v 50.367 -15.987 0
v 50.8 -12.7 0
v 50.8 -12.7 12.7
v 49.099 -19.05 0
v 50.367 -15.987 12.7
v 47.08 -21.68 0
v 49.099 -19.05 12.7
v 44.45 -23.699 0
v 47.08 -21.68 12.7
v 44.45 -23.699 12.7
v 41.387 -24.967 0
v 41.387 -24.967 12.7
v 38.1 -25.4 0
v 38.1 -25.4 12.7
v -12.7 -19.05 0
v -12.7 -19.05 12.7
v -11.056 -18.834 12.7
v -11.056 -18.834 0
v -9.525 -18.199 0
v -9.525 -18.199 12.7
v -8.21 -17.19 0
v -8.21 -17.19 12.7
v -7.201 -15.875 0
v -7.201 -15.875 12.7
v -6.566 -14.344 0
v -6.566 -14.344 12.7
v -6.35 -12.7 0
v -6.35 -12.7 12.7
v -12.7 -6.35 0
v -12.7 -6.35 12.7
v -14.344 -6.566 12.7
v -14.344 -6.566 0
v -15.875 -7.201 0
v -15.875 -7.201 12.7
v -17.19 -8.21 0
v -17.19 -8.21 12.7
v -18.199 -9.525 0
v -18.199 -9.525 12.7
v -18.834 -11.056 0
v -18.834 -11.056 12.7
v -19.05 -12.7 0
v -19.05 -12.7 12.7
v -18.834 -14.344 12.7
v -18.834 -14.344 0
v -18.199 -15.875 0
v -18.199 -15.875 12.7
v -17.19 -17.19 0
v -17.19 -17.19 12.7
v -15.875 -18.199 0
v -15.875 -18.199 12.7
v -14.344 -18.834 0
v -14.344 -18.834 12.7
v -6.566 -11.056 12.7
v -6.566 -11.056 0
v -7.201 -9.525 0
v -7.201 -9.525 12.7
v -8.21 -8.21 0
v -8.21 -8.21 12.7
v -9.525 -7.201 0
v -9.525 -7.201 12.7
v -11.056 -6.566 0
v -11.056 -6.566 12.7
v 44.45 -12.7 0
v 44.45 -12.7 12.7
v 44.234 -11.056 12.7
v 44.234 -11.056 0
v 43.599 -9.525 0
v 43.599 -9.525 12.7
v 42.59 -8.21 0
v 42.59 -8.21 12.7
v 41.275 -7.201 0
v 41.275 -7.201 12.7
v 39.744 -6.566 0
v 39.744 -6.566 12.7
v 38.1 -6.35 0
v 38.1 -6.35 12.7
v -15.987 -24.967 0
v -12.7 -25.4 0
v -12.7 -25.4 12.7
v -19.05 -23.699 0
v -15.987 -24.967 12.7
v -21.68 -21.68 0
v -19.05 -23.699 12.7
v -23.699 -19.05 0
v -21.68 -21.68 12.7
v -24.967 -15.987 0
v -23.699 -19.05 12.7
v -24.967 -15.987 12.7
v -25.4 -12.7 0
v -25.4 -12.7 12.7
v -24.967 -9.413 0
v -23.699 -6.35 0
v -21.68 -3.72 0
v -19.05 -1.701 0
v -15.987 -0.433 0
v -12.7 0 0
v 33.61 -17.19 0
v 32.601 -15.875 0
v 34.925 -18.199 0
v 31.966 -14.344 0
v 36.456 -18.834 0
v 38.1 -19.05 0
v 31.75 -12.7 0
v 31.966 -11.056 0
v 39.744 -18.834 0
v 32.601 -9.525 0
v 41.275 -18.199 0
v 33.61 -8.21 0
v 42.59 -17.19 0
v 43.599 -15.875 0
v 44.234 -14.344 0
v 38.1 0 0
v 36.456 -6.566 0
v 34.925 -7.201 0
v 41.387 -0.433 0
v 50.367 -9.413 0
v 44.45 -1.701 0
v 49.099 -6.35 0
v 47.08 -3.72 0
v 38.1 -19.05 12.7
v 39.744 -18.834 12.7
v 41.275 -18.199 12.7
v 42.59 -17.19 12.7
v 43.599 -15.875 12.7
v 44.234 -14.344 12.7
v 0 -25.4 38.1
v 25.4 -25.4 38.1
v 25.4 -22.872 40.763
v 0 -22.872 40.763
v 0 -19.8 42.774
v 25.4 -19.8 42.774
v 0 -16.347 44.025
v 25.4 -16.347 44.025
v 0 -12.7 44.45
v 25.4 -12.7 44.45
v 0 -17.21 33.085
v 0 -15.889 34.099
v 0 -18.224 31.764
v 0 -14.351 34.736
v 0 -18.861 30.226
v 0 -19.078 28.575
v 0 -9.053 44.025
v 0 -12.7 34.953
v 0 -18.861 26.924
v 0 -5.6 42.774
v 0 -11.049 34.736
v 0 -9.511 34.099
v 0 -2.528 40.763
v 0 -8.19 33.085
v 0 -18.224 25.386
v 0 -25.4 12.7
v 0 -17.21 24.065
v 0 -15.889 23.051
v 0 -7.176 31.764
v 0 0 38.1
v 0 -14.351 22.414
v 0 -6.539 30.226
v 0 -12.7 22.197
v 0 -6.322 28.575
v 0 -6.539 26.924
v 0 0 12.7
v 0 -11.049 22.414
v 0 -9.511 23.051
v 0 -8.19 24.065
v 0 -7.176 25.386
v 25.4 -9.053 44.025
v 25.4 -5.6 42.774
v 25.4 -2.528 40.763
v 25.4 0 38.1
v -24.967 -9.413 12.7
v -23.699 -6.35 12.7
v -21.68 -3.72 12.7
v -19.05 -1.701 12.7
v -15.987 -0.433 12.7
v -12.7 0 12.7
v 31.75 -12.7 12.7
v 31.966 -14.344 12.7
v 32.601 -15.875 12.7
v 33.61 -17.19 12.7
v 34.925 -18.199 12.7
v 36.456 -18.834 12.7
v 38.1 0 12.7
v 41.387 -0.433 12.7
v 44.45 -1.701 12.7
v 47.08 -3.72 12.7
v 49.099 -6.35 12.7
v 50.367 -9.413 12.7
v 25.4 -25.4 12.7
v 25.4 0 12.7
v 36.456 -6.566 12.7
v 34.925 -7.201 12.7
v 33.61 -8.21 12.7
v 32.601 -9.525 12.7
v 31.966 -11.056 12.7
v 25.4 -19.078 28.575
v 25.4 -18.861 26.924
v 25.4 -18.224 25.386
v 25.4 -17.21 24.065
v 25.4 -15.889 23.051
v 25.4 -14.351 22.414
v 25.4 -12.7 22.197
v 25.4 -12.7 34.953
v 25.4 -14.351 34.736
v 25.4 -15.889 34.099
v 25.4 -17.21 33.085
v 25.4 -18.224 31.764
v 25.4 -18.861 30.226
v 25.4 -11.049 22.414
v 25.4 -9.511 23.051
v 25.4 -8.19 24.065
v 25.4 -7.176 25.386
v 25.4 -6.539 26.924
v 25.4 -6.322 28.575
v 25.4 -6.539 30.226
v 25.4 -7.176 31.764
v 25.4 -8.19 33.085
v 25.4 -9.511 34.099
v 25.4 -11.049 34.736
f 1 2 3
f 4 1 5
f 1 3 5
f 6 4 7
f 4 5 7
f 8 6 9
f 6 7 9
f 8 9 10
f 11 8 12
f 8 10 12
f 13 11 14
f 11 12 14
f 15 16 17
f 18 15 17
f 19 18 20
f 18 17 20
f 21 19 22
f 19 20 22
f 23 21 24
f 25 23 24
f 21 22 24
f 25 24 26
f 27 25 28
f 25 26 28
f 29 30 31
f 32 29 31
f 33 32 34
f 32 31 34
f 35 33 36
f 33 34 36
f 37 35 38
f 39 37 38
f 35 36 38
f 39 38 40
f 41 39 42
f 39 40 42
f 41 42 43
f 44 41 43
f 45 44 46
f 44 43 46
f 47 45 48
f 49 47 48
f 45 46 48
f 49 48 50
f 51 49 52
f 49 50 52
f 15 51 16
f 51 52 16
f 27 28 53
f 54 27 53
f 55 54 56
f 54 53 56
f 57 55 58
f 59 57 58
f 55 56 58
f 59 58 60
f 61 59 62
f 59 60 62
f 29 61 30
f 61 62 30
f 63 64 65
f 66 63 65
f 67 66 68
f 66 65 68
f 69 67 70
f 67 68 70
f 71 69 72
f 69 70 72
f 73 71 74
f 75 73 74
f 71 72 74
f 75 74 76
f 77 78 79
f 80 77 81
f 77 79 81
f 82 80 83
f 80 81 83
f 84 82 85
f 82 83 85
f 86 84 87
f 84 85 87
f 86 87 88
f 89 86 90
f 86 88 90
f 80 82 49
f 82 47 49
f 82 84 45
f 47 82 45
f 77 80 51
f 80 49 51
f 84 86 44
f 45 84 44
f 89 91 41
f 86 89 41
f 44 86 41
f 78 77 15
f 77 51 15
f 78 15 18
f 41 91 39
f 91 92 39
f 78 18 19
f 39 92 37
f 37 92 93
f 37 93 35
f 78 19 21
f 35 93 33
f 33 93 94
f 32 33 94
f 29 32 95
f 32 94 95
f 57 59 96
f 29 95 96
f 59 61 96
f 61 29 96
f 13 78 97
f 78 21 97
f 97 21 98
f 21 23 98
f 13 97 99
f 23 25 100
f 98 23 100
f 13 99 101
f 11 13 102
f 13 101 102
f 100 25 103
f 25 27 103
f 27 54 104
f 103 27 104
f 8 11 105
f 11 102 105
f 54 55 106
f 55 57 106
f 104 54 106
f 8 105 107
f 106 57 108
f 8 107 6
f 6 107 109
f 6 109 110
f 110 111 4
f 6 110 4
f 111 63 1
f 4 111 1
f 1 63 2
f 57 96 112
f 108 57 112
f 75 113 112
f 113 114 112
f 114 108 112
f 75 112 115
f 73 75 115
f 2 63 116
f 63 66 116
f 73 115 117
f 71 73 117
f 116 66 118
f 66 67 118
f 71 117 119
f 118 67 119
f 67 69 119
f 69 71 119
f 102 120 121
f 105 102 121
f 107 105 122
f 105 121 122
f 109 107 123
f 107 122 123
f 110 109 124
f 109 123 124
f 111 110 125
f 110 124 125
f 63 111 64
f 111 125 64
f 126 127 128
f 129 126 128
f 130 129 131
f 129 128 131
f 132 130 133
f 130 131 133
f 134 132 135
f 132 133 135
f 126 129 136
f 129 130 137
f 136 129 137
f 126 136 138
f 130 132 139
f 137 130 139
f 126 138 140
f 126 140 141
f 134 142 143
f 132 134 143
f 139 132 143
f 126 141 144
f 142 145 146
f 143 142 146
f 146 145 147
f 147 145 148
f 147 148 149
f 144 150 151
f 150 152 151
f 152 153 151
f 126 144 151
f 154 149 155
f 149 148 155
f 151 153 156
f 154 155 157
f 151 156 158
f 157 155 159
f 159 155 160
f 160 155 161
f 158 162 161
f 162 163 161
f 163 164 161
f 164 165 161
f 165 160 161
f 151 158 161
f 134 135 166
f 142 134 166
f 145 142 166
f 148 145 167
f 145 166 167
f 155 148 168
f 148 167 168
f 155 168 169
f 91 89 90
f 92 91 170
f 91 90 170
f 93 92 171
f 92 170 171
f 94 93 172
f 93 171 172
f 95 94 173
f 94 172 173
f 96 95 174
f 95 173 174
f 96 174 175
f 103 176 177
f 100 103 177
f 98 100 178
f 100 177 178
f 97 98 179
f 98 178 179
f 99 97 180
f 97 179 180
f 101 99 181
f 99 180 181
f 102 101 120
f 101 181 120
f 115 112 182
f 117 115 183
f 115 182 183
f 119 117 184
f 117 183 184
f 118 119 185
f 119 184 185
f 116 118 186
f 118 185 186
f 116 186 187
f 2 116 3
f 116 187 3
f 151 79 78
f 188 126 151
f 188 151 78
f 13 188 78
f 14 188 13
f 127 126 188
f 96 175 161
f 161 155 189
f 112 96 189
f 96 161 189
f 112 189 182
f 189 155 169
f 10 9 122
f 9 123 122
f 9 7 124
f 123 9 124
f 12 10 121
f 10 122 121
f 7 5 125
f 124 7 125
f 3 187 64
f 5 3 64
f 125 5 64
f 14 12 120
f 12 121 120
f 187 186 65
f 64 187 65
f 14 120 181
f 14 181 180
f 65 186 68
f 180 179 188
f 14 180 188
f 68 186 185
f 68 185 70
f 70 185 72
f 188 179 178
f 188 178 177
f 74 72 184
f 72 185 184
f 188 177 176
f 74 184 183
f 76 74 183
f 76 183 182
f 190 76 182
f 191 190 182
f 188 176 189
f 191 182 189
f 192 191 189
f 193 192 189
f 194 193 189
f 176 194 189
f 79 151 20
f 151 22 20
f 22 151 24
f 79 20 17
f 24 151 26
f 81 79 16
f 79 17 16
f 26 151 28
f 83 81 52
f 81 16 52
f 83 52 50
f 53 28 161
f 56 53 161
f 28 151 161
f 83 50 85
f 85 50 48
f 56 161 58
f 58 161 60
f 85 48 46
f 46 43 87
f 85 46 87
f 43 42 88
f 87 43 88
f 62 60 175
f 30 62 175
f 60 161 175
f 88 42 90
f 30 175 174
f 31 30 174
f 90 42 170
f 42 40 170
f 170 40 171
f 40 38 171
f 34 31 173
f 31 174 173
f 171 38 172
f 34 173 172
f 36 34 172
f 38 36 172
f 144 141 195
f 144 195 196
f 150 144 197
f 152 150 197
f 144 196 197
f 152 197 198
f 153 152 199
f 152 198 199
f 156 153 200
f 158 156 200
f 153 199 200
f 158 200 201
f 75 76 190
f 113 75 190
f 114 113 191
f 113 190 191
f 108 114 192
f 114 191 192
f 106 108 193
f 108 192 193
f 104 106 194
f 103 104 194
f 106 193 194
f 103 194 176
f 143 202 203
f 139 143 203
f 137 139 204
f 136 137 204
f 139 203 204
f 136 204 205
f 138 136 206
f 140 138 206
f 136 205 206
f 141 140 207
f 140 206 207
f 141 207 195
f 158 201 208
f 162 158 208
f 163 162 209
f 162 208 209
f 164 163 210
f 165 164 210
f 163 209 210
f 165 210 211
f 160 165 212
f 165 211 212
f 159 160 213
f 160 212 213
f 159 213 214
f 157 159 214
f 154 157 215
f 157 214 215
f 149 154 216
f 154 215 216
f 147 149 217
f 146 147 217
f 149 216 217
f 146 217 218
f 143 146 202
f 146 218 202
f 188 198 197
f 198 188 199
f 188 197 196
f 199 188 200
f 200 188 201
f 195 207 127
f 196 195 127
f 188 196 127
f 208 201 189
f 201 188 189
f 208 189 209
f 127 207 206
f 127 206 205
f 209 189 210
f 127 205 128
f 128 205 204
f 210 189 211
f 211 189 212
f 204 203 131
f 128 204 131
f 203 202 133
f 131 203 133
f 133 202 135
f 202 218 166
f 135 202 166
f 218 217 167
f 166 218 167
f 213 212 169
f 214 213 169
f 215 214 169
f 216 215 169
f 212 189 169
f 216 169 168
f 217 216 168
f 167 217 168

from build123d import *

# Parameters (mm, degrees)
F1_DEPTH = 25.4
F3_DEPTH = 25.4
F5_DEPTH = 25.4
F7_DEPTH = 25.4


with BuildPart() as f1:
    # F0 (on Front) → F1 (new body)
    with BuildSketch(Plane.XZ):
        Polygon((-25.4, 12.7), (-25.4, 0), (50.8, 0), (50.8, 12.7), (25.4, 12.7), (25.4, 44.45), (0, 44.45), (0, 12.7), align=None)
    extrude(amount=F1_DEPTH)

    # F2 (on face) → F3 (cut)
    with BuildSketch(Plane.YZ.offset(25.4)):
        with BuildLine():
            Line((-25.4, 28.575), (-25.4, 38.1))
            ThreePointArc((-25.4, 38.1), (-28.575, 28.575), (-25.4, 19.05))
            Line((-25.4, 19.05), (-25.4, 28.575))
        make_face()
        with BuildLine():
            ThreePointArc((3.175, 28.575), (2.3603473566, 33.5951157855), (0, 38.1))
            Line((0, 38.1), (0, 28.575))
            Line((0, 28.575), (0, 19.05))
            ThreePointArc((0, 19.05), (2.3603473566, 23.5548842145), (3.175, 28.575))
        make_face()
        with BuildLine():
            Line((0, 44.45), (-12.7, 44.45))
            ThreePointArc((-12.7, 44.45), (-5.6004841714, 42.7740316571), (0, 38.1))
            Line((0, 38.1), (0, 44.45))
        make_face()
        with BuildLine():
            ThreePointArc((-25.4, 38.1), (-19.7995158286, 42.7740316571), (-12.7, 44.45))
            Line((-12.7, 44.45), (-25.4, 44.45))
            Line((-25.4, 44.45), (-25.4, 38.1))
        make_face()
        with BuildLine():
            ThreePointArc((-6.3216395999, 28.575), (-8.1898181082, 33.0851818918), (-12.7, 34.9533604001))
            Line((-12.7, 34.9533604001), (-12.7, 28.575))
            Line((-12.7, 28.575), (-6.3216395999, 28.575))
        make_face()
        with BuildLine():
            Line((-12.7, 28.575), (-12.7, 34.9533604001))
            ThreePointArc((-12.7, 34.9533604001), (-17.2101818918, 33.0851818918), (-19.0783604001, 28.575))
            Line((-19.0783604001, 28.575), (-12.7, 28.575))
        make_face()
        with BuildLine():
            Line((-6.3216395999, 28.575), (-12.7, 28.575))
            Line((-12.7, 28.575), (-12.7, 22.1966395999))
            ThreePointArc((-12.7, 22.1966395999), (-8.1898181082, 24.0648181082), (-6.3216395999, 28.575))
        make_face()
        with BuildLine():
            Line((-12.7, 22.1966395999), (-12.7, 28.575))
            Line((-12.7, 28.575), (-19.0783604001, 28.575))
            ThreePointArc((-19.0783604001, 28.575), (-17.2101818918, 24.0648181082), (-12.7, 22.1966395999))
        make_face()
    extrude(amount=-F3_DEPTH, mode=Mode.SUBTRACT)

    # F4 (on face) → F5 (cut)
    with BuildSketch(Plane.XY.offset(12.7)):
        with BuildLine():
            Line((44.45, -12.7), (38.1, -12.7))
            Line((38.1, -12.7), (38.1, -19.05))
            ThreePointArc((38.1, -19.05), (42.5901280605, -17.1901280605), (44.45, -12.7))
        make_face()
        with BuildLine():
            ThreePointArc((44.45, -12.7), (42.5901280605, -8.2098719395), (38.1, -6.35))
            Line((38.1, -6.35), (38.1, -12.7))
            Line((38.1, -12.7), (44.45, -12.7))
        make_face()
        with BuildLine():
            Line((38.1, -12.7), (38.1, -6.35))
            ThreePointArc((38.1, -6.35), (33.6098719395, -8.2098719395), (31.75, -12.7))
            Line((31.75, -12.7), (38.1, -12.7))
        make_face()
        with BuildLine():
            Line((38.1, -19.05), (38.1, -12.7))
            Line((38.1, -12.7), (31.75, -12.7))
            ThreePointArc((31.75, -12.7), (33.6098719395, -17.1901280605), (38.1, -19.05))
        make_face()
        with BuildLine():
            Line((50.8, 0), (38.1, 0))
            ThreePointArc((38.1, 0), (47.0802561211, -3.7197438789), (50.8, -12.7))
            Line((50.8, -12.7), (50.8, 0))
        make_face()
        with BuildLine():
            Line((50.8, -25.4), (50.8, -12.7))
            ThreePointArc((50.8, -12.7), (47.0802561211, -21.6802561211), (38.1, -25.4))
            Line((38.1, -25.4), (50.8, -25.4))
        make_face()
    extrude(amount=-F5_DEPTH, mode=Mode.SUBTRACT)

    # F6 (on face) → F7 (cut)
    with BuildSketch(Plane.XY.offset(12.7)):
        with BuildLine():
            Line((-6.35, -12.7), (-12.7, -12.7))
            Line((-12.7, -12.7), (-12.7, -19.05))
            ThreePointArc((-12.7, -19.05), (-8.2098719395, -17.1901280605), (-6.35, -12.7))
        make_face()
        with BuildLine():
            Line((-12.7, -19.05), (-12.7, -12.7))
            Line((-12.7, -12.7), (-19.05, -12.7))
            ThreePointArc((-19.05, -12.7), (-17.1901280605, -17.1901280605), (-12.7, -19.05))
        make_face()
        with BuildLine():
            Line((-12.7, -12.7), (-12.7, -6.35))
            ThreePointArc((-12.7, -6.35), (-17.1901280605, -8.2098719395), (-19.05, -12.7))
            Line((-19.05, -12.7), (-12.7, -12.7))
        make_face()
        with BuildLine():
            ThreePointArc((-6.35, -12.7), (-8.2098719395, -8.2098719395), (-12.7, -6.35))
            Line((-12.7, -6.35), (-12.7, -12.7))
            Line((-12.7, -12.7), (-6.35, -12.7))
        make_face()
        with BuildLine():
            ThreePointArc((-12.7, -25.4), (-21.6802561211, -21.6802561211), (-25.4, -12.7))
            Line((-25.4, -12.7), (-25.4, -25.4))
            Line((-25.4, -25.4), (-12.7, -25.4))
        make_face()
        with BuildLine():
            ThreePointArc((-25.4, -12.7), (-21.6802561211, -3.7197438789), (-12.7, 0))
            Line((-12.7, 0), (-25.4, 0))
            Line((-25.4, 0), (-25.4, -12.7))
        make_face()
    extrude(amount=-F7_DEPTH, mode=Mode.SUBTRACT)


solid = f1.part
